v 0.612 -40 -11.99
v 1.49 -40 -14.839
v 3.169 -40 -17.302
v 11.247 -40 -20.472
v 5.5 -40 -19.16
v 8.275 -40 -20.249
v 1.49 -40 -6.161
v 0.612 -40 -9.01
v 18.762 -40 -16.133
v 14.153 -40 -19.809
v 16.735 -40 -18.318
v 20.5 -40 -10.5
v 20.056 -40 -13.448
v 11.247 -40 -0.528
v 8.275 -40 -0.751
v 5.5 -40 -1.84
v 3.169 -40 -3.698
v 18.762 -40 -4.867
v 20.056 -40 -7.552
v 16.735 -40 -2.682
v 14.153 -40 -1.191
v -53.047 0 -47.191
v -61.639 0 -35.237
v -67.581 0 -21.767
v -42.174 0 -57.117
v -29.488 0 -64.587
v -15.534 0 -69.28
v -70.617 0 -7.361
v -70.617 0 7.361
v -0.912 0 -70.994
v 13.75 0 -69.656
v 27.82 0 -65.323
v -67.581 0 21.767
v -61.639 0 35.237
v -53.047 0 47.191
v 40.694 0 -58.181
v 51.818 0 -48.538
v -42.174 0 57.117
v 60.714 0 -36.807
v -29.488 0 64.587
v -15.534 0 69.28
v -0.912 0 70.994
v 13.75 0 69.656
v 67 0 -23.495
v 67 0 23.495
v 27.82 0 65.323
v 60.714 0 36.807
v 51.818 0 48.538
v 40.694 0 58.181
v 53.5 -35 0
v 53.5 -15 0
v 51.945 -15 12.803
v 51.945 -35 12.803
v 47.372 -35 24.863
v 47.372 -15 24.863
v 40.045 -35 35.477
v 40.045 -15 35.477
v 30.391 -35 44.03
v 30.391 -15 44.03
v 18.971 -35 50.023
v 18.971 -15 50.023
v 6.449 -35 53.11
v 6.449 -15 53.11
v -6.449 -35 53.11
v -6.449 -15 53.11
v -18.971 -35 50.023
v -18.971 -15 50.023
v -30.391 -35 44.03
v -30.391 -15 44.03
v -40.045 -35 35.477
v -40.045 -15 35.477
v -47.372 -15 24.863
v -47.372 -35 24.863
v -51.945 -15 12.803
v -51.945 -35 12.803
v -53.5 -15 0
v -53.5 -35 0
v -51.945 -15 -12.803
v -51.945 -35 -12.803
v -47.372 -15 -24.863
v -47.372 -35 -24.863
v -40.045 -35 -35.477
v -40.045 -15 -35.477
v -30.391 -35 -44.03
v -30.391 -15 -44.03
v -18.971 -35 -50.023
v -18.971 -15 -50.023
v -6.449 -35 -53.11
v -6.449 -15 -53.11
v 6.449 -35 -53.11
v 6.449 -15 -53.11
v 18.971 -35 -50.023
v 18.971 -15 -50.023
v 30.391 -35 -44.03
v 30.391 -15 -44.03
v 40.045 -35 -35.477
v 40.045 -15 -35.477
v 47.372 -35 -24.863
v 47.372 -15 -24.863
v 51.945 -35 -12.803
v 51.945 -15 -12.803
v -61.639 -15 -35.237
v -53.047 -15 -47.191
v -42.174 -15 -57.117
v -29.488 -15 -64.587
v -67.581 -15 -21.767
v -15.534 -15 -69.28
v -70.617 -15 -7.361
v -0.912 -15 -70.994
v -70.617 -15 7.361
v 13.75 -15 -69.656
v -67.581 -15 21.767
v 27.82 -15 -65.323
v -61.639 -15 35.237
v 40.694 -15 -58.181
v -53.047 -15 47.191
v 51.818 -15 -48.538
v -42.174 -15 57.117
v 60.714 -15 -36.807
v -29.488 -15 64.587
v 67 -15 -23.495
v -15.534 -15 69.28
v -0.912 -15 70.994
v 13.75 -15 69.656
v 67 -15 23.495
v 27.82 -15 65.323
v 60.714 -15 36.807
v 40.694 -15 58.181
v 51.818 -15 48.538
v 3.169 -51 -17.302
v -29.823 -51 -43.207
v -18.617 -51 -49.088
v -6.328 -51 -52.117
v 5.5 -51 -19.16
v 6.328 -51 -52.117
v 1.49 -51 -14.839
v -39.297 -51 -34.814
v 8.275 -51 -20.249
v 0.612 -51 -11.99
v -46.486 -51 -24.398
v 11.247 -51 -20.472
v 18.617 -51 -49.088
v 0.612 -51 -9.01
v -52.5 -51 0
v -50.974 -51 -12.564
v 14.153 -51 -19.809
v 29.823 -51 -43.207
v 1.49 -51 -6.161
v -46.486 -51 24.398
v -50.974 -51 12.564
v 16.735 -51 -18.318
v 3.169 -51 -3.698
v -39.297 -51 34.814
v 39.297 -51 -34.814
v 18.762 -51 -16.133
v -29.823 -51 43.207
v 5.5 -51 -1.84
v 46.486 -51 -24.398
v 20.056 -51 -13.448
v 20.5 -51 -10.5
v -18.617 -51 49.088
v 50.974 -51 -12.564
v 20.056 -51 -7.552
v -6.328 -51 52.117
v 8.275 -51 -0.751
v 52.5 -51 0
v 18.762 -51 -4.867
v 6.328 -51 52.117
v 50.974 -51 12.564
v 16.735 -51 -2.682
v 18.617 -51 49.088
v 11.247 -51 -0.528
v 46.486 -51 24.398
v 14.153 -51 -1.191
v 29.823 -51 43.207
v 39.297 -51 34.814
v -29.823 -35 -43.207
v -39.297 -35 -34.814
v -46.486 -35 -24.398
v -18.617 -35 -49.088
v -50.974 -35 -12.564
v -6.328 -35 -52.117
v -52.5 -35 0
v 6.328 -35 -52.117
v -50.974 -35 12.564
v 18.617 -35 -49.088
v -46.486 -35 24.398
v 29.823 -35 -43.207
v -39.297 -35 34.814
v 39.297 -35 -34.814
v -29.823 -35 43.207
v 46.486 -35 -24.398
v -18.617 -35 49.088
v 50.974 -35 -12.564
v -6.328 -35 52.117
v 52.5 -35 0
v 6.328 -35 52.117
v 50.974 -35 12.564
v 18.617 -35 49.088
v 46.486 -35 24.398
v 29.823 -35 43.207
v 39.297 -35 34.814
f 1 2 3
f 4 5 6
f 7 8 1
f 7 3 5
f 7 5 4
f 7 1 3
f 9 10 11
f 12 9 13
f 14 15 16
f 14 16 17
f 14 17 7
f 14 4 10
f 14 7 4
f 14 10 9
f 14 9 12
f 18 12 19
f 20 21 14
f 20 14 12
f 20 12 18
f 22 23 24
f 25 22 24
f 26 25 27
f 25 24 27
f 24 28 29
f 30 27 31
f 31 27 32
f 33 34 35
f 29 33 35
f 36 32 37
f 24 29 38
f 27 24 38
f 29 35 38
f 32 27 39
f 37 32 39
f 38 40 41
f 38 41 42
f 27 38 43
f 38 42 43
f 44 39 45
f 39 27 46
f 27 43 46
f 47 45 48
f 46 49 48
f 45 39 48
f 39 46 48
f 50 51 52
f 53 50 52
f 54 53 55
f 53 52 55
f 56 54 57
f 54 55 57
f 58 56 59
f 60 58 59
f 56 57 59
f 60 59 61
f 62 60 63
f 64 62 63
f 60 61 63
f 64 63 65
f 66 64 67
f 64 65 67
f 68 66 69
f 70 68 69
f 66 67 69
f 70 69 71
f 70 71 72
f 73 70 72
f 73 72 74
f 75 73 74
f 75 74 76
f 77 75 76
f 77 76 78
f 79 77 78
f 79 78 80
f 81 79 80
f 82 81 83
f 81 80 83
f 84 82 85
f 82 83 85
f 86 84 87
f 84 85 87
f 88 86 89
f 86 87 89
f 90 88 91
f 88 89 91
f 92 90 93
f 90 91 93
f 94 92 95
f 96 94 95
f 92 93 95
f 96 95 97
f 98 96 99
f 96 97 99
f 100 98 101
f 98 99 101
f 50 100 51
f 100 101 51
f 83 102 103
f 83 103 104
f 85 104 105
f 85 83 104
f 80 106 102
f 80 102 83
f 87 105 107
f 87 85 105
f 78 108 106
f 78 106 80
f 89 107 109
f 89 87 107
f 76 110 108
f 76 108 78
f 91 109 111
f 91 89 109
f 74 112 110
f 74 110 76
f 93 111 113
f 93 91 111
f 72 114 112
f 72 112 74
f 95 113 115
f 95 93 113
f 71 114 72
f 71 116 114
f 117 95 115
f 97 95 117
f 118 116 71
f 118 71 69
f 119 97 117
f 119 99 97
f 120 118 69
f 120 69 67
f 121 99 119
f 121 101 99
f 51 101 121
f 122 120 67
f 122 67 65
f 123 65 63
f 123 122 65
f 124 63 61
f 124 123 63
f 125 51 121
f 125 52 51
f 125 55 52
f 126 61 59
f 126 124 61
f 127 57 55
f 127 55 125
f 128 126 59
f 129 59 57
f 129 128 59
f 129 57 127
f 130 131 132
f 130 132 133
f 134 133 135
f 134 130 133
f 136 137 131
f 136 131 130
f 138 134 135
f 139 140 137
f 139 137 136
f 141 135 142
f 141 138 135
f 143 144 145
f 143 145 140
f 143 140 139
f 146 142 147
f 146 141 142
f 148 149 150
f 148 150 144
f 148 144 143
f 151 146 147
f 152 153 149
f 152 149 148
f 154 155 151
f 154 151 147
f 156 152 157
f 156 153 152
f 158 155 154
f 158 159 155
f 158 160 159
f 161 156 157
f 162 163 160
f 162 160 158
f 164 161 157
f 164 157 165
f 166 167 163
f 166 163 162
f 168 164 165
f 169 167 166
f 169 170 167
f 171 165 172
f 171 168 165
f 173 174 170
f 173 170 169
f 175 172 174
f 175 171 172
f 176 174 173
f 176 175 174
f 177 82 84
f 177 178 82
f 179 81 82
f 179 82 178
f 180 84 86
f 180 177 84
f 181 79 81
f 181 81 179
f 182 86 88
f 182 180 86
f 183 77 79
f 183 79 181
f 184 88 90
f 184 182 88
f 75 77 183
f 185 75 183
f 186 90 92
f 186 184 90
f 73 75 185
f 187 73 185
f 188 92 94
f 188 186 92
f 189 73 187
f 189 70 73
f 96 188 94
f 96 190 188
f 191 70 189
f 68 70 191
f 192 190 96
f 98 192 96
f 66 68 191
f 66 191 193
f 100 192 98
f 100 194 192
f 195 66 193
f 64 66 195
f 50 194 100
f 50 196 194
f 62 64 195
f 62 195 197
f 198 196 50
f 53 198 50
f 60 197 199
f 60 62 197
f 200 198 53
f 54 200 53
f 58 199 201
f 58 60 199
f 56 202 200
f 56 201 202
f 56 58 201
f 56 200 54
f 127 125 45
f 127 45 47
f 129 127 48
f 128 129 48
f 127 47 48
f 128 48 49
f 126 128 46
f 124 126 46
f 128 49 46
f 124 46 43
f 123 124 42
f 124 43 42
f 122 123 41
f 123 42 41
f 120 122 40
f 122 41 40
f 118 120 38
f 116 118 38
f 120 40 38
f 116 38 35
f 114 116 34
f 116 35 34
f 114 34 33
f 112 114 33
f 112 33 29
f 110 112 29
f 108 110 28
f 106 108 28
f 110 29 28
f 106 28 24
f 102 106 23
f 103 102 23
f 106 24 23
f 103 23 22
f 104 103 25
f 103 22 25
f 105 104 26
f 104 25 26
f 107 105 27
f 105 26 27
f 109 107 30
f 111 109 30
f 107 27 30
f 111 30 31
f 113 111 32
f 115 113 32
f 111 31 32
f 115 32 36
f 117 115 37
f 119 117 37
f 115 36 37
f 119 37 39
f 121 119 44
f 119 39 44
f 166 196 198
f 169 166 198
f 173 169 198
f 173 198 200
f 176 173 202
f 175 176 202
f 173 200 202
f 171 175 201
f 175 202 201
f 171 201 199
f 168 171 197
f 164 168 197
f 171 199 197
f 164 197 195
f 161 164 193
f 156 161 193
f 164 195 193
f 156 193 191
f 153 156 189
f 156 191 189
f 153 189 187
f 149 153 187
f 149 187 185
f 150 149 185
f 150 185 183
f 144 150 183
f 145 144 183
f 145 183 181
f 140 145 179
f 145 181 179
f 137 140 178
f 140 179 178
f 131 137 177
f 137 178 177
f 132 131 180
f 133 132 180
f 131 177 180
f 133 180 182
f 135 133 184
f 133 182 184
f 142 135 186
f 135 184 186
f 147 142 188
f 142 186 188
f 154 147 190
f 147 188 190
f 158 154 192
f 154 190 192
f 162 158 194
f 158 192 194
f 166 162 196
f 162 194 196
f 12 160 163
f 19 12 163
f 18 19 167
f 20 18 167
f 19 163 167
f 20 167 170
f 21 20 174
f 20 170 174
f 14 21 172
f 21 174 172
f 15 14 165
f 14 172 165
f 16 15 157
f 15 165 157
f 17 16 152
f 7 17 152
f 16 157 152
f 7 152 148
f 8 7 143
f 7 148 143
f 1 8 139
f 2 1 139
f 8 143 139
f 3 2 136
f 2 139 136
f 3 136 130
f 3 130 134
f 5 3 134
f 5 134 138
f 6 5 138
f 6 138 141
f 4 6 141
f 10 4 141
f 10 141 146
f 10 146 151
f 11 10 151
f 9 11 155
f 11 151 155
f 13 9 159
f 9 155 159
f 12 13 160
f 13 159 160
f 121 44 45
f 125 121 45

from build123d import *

# Parameters (mm, degrees)
F1_DEPTH = 15
F2_R     = 53.5
F3_DEPTH = 20
F4_R     = 52.5
F5_DEPTH = 16
F6_R     = 10
F7_DEPTH = 11


with BuildPart() as f1:
    # F0 (on Front) → F1 (new body)
    with BuildSketch(Plane.XZ):
        with BuildLine():
            Line((67, -23.49468), (67, 23.49468))
            ThreePointArc((67, 23.49468), (-71, 0), (67, -23.49468))
        make_face()
    extrude(amount=F1_DEPTH)

    # F2 (on face) → F3 (join)
    with BuildSketch(Plane.XZ.offset(15)):
        Circle(F2_R)
    extrude(amount=F3_DEPTH)

    # F4 (on face) → F5 (join)
    with BuildSketch(Plane.XZ.offset(35)):
        Circle(F4_R)
    extrude(amount=F5_DEPTH)

    # F6 (on face) → F7 (cut)
    with BuildSketch(Plane.XZ.offset(51)):
        with Locations((10.5, -10.5)):
            Circle(F6_R)
    extrude(amount=-F7_DEPTH, mode=Mode.SUBTRACT)


solid = f1.part
